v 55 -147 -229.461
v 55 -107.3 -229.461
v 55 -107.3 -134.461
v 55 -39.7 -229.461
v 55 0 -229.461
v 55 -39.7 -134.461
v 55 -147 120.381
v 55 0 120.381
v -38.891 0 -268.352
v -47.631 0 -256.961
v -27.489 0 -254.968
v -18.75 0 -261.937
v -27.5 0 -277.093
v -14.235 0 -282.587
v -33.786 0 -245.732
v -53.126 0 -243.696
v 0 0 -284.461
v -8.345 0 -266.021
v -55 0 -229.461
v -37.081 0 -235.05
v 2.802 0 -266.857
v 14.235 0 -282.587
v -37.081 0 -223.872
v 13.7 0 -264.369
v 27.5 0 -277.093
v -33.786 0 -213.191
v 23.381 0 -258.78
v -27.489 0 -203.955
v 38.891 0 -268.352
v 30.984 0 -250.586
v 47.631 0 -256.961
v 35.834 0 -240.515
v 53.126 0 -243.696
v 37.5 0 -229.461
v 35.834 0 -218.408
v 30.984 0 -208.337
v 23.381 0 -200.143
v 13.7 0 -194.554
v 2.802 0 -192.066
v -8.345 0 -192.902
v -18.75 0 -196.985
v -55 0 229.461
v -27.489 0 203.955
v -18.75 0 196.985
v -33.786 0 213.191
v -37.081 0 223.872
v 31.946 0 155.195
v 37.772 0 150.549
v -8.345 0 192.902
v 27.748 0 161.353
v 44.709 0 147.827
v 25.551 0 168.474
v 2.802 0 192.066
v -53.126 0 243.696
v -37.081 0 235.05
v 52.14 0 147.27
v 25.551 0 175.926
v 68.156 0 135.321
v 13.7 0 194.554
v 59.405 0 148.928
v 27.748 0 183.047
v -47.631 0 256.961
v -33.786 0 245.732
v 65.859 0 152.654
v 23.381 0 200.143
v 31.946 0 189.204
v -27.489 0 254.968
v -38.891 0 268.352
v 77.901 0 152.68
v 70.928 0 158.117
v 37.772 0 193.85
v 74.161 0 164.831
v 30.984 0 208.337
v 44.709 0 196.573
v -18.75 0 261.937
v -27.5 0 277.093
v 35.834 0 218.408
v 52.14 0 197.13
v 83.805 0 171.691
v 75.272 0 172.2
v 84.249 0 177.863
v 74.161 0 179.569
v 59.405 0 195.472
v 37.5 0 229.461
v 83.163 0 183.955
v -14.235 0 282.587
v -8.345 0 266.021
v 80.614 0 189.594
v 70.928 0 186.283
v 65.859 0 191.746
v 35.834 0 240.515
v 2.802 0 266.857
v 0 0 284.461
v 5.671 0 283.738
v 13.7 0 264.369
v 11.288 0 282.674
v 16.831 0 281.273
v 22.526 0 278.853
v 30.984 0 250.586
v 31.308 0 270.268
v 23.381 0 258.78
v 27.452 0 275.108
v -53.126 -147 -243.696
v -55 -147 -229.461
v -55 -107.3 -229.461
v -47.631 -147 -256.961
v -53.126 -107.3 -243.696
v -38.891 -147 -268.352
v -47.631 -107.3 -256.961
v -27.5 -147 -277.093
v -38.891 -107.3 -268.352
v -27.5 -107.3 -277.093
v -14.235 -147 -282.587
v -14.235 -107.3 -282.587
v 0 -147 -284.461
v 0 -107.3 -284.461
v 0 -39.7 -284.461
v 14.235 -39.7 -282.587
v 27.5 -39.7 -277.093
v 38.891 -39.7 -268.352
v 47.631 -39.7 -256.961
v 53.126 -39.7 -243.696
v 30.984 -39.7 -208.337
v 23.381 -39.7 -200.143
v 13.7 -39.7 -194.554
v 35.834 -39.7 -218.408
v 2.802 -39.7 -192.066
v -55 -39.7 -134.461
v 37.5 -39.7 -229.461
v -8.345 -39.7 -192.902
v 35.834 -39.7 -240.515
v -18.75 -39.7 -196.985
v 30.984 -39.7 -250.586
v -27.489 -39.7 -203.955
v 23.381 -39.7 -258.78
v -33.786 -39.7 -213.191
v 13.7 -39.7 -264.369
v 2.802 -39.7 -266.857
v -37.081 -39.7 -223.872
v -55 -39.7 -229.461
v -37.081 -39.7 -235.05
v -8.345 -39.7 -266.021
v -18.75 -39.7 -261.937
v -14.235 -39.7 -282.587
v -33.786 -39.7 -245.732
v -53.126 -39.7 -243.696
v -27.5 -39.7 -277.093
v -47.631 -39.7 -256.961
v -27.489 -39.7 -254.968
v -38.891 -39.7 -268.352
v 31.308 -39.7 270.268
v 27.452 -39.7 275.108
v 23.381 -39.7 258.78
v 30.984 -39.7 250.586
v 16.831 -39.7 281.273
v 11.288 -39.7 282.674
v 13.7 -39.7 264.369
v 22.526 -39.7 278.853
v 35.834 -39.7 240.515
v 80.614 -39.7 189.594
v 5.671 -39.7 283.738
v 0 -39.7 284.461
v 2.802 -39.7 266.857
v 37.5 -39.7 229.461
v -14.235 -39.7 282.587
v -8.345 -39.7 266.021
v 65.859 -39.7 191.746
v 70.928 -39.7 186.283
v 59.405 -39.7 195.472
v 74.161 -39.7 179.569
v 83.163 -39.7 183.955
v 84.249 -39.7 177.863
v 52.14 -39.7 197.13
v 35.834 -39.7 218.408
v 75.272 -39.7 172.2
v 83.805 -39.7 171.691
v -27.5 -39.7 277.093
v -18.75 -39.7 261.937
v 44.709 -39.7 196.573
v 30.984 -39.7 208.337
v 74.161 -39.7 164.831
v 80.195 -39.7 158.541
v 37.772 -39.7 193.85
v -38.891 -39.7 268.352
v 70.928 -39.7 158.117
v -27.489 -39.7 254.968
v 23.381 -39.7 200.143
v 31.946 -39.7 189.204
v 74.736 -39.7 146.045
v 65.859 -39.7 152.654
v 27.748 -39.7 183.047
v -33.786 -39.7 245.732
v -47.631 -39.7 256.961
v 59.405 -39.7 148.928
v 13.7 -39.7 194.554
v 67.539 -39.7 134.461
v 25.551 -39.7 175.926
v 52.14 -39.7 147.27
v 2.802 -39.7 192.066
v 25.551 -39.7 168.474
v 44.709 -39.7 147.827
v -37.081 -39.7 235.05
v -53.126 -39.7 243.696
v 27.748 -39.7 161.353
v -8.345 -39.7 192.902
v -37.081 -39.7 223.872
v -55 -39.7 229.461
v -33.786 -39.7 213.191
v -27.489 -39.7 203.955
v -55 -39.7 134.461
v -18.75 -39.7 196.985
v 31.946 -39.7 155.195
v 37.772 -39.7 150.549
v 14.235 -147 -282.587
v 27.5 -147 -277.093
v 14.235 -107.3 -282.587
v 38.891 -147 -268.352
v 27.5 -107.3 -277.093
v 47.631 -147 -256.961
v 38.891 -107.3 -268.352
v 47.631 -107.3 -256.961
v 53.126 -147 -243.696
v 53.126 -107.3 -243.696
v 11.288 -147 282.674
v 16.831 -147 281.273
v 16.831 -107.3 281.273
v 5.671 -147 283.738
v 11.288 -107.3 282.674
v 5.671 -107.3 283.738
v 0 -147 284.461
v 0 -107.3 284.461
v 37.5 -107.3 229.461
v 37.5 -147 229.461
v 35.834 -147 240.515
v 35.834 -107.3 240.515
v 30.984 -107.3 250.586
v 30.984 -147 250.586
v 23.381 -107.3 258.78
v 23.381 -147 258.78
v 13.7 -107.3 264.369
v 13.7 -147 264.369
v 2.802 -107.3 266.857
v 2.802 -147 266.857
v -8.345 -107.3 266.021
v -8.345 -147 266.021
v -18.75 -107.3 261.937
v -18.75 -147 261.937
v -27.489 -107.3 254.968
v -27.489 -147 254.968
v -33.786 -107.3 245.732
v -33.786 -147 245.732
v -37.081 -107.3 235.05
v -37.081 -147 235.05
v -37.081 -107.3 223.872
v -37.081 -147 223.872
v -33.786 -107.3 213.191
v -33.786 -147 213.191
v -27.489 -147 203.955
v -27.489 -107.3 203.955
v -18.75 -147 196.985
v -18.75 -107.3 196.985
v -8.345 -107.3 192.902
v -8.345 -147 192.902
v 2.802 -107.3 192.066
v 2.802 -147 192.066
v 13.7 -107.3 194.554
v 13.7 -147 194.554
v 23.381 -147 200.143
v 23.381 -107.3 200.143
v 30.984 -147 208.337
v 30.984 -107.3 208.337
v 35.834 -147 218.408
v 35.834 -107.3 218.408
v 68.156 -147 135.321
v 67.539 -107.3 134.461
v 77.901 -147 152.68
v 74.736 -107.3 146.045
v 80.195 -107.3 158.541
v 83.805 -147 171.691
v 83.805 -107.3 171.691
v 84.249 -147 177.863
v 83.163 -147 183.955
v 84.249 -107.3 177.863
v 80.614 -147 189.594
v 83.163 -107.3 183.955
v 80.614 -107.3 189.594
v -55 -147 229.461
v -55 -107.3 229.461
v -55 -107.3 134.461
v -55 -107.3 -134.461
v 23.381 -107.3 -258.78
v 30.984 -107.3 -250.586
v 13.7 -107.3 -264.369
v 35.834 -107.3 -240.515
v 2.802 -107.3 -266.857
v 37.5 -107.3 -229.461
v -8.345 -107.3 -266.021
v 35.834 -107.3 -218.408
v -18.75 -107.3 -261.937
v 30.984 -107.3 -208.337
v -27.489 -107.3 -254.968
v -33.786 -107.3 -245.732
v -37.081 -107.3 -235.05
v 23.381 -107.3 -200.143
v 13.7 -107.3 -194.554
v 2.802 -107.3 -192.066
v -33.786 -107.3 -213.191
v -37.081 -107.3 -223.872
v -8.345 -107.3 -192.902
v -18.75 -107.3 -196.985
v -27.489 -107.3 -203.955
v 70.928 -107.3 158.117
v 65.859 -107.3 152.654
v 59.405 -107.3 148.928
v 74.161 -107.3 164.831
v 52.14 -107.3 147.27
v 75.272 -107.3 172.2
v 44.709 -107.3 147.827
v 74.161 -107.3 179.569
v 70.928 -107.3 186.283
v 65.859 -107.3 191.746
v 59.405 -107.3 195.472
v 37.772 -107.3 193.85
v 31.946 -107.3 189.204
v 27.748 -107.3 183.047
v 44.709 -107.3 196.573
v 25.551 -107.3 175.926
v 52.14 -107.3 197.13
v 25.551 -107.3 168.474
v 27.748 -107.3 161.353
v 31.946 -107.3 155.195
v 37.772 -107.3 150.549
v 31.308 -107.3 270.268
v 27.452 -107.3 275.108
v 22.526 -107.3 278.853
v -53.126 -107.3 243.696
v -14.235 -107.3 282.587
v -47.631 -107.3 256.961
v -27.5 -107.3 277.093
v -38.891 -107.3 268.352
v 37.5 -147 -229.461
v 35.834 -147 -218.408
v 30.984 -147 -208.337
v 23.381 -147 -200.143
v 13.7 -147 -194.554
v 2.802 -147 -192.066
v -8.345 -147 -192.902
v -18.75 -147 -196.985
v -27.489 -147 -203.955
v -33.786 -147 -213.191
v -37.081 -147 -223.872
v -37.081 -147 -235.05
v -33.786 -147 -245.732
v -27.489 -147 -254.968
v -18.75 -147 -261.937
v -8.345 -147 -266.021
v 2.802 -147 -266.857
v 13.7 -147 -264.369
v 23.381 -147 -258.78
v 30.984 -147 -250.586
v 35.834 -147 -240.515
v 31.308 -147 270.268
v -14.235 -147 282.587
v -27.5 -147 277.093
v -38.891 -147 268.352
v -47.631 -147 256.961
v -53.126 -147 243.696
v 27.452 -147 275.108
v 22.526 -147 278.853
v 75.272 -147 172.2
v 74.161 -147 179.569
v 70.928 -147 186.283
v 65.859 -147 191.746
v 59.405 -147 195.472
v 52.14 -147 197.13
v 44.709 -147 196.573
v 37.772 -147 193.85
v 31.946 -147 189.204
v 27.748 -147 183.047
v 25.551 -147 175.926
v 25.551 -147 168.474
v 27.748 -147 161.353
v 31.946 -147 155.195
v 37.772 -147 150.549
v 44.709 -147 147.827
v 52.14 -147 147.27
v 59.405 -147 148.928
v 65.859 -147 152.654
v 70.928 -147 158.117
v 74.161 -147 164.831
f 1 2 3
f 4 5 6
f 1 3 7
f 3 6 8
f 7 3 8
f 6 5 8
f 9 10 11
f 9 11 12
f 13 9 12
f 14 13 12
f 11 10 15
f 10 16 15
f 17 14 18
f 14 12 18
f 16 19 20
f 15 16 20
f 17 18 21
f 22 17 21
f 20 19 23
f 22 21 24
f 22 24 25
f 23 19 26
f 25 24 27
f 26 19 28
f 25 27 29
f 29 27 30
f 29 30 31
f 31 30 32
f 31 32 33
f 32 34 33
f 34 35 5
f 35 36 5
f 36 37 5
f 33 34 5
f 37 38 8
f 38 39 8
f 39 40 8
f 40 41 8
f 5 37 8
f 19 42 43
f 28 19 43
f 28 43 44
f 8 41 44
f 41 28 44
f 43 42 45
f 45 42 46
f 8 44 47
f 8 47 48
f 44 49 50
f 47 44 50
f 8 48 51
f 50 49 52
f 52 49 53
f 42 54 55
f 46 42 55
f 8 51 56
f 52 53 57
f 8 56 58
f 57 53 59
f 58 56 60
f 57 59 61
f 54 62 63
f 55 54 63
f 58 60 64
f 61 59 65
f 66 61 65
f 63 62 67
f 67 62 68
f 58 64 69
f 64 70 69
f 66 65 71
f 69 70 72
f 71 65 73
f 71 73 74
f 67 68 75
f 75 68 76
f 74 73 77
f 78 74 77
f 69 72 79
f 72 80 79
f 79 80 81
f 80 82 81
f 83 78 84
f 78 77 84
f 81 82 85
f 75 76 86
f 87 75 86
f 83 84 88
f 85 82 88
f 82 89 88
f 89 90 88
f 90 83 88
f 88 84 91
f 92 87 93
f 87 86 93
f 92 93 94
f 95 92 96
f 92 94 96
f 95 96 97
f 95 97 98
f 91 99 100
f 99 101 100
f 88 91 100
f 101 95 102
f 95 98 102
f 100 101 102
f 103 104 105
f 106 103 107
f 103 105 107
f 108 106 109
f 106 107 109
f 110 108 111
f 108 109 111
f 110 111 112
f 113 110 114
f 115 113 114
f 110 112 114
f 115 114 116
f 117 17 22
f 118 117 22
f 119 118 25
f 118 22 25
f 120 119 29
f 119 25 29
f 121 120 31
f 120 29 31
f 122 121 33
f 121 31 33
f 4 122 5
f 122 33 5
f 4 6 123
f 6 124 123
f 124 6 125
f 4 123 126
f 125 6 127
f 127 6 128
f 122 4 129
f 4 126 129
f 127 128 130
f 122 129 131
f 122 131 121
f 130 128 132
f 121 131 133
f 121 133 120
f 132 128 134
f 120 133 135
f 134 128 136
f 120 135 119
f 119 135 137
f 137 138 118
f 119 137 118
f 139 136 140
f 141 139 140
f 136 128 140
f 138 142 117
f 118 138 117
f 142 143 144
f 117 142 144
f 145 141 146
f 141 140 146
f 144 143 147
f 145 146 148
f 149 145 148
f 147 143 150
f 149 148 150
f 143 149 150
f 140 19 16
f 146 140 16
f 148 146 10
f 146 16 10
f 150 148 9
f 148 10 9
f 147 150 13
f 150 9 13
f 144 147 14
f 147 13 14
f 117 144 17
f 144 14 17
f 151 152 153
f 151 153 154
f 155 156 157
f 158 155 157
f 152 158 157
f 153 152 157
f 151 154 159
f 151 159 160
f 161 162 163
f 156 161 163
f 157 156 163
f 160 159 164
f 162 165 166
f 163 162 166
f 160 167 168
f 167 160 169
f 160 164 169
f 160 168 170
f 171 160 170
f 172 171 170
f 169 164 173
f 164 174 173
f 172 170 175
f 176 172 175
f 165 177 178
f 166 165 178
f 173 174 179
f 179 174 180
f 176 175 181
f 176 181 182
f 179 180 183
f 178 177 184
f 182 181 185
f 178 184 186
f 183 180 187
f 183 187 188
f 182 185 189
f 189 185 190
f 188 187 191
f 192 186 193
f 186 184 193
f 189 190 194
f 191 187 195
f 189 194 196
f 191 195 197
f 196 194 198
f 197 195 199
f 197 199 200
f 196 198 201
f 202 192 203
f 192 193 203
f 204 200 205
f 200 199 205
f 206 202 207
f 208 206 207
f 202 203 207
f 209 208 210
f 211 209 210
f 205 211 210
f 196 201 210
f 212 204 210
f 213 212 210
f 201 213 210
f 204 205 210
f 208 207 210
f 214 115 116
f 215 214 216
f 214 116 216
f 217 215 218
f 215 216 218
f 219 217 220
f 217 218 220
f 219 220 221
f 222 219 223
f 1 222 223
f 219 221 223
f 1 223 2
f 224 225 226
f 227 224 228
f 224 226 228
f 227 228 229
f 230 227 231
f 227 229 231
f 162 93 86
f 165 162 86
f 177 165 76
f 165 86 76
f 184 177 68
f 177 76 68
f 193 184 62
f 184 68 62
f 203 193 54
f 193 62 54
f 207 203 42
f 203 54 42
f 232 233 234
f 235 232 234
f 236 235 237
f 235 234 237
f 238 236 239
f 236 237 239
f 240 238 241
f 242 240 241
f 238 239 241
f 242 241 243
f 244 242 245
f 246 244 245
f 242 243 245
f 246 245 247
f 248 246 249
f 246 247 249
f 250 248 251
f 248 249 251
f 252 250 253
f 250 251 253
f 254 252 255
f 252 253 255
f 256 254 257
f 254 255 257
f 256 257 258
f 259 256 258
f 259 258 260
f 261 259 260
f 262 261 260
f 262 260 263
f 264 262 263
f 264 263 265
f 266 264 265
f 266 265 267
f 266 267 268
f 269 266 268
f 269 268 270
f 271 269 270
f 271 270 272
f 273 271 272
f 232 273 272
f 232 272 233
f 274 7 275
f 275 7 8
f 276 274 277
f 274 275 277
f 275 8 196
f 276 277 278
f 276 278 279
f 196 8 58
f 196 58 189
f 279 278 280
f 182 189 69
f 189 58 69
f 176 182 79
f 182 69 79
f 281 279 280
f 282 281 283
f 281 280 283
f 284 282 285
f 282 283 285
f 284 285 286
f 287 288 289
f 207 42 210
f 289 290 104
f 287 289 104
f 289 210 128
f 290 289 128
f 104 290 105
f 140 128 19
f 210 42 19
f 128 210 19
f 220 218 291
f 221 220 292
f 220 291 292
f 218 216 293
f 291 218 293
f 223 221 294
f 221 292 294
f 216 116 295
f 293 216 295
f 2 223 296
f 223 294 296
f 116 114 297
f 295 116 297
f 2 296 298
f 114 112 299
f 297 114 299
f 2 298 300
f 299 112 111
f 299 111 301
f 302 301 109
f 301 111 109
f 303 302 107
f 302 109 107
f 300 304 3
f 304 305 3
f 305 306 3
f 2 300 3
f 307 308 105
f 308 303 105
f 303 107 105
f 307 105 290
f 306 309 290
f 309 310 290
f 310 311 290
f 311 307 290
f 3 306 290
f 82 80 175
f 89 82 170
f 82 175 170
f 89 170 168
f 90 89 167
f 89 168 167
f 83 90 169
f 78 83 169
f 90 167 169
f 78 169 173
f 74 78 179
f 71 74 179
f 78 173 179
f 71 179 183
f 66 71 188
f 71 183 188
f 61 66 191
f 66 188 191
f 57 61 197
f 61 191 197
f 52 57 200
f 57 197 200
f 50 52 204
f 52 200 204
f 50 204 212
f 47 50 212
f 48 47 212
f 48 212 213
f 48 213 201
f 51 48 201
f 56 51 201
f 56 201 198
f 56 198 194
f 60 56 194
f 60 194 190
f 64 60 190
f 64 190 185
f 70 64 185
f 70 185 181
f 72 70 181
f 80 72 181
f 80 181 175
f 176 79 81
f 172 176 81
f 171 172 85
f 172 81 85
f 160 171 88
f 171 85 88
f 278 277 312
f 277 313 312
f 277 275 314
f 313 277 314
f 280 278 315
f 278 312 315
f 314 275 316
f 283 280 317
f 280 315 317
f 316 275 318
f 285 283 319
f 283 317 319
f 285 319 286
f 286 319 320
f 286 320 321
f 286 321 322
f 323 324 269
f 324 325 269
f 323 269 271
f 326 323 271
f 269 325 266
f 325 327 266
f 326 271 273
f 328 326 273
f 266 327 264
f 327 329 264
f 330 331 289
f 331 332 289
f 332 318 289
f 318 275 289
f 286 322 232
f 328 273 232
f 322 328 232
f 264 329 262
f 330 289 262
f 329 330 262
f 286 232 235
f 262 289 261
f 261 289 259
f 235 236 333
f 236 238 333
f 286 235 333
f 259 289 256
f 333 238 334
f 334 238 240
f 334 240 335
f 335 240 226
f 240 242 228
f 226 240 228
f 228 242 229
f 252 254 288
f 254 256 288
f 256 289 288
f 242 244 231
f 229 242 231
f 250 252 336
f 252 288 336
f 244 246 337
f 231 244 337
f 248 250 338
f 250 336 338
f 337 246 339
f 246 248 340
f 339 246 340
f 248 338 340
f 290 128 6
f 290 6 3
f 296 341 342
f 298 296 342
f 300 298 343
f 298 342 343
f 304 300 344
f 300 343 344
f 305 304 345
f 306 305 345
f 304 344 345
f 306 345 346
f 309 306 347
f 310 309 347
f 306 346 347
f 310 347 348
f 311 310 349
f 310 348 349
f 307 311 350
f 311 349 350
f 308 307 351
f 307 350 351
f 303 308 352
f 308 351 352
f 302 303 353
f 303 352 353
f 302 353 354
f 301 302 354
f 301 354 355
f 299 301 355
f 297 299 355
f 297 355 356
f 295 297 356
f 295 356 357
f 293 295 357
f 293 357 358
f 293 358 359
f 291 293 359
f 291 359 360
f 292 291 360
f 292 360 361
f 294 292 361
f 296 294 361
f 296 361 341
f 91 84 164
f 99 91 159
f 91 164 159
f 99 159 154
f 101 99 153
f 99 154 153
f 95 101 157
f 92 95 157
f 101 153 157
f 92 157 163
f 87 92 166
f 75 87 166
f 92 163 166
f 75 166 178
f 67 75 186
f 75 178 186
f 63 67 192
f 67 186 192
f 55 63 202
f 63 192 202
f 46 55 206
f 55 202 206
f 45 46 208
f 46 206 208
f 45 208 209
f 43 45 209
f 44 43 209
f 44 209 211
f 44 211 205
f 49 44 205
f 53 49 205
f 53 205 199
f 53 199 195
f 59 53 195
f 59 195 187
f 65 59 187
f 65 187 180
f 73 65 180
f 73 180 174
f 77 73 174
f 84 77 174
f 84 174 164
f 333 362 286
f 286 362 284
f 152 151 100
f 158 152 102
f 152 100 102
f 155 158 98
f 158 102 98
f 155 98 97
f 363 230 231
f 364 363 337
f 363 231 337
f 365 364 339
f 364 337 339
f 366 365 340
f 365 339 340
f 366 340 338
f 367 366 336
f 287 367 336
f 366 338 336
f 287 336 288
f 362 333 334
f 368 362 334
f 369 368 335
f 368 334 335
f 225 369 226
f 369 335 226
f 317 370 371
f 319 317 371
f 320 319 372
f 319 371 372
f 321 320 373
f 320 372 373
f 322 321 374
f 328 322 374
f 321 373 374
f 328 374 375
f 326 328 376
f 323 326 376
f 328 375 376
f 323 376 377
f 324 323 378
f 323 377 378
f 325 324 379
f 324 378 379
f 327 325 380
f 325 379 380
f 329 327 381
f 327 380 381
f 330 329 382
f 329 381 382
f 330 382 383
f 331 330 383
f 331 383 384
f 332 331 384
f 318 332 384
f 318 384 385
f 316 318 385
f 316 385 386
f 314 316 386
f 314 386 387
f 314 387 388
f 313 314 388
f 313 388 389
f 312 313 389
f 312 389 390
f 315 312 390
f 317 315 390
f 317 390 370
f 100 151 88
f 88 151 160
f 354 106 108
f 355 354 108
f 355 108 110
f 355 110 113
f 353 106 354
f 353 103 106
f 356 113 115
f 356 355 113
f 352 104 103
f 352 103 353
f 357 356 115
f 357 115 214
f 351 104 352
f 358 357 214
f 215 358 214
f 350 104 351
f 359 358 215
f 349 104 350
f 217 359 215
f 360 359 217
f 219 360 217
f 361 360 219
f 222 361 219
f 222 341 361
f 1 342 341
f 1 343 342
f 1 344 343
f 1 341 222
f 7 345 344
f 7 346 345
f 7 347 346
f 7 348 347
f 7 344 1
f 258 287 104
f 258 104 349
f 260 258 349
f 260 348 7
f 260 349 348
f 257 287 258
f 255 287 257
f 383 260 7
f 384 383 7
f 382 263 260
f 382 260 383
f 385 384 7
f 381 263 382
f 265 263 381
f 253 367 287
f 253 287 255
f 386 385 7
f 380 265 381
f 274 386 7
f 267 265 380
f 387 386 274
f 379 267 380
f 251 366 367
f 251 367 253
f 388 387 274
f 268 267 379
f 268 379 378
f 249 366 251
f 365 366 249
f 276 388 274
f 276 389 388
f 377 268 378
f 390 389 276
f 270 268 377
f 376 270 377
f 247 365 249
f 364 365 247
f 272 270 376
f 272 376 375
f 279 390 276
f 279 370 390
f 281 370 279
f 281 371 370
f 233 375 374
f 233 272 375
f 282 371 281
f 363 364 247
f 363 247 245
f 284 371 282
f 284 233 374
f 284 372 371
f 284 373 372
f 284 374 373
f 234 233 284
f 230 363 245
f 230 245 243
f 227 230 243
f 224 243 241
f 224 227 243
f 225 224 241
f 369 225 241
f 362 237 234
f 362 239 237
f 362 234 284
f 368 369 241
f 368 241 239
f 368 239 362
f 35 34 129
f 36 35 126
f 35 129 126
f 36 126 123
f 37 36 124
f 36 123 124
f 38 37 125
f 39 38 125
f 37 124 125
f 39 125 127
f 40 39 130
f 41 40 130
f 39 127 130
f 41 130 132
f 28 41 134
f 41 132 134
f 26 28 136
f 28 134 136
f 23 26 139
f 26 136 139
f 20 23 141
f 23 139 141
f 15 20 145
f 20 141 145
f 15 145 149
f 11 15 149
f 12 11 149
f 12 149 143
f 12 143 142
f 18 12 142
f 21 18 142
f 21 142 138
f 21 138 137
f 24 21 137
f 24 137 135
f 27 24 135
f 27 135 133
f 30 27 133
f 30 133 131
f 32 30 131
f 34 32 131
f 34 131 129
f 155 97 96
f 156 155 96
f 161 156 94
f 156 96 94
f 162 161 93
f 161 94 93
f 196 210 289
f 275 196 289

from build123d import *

# Parameters (mm, degrees)
F1_DEPTH = 147
F2_R     = 37.5
F2_R_2   = 25
F3_DEPTH = 147.001
F5_DEPTH = 147.001
F6_R     = 25
F7_W     = 67.6
F7_H     = 95
F7_H_2   = 55
F8_DEPTH = 139.2839551991


with BuildPart() as f1:
    # F0 (on Front) → F1 (new body)
    with BuildSketch(Plane.XZ):
        with BuildLine():
            Line((55, -229.4613795656), (55, 120.3808841783))
            ThreePointArc((55, 120.3808841783), (80.7033356829, 220.2549606622), (0, 284.4613795656))
            ThreePointArc((0, 284.4613795656), (-38.8908729653, 268.3522525309), (-55, 229.4613795656))
            Line((-55, 229.4613795656), (-55, -229.4613795656))
            ThreePointArc((-55, -229.4613795656), (-38.8908729653, -268.3522525309), (0, -284.4613795656))
            ThreePointArc((0, -284.4613795656), (38.8908729653, -268.3522525309), (55, -229.4613795656))
        make_face()
    extrude(amount=F1_DEPTH)

    # F2 (on face) → F3 (cut, through all)
    with BuildSketch(Plane.XZ.offset(147)):
        with Locations((0, 229.4613795656)):
            Circle(F2_R)
        with Locations((0, -229.4613795656)):
            Circle(F2_R)
        with Locations((50.271846354, 172.1997708082)):
            Circle(F2_R_2)
    extrude(amount=-F3_DEPTH, mode=Mode.SUBTRACT)

    # F4 (on face) → F5 (cut, through all)
    with BuildSketch(Plane.XZ.offset(147)):
        with BuildLine():
            ThreePointArc((85.2657948536, 181.983535776), (71.7102726141, 239.5566412204), (26.6566362615, 277.878756312))
            Line((26.6566362615, 277.878756312), (85.2657948536, 181.983535776))
        make_face()
    extrude(amount=-F5_DEPTH, mode=Mode.SUBTRACT)

    # F6
    f6_edges = [f1.edges().sort_by_distance(p)[0] for p in [
        (85.265795, -73.5, 181.983536),
        (26.656636, -73.5, 277.878756),
    ]]
    fillet(f6_edges, radius=F6_R)

    # F7 (on face) → F8 (cut, through all)
    with BuildSketch(Plane(origin=(-55, 0, 0), x_dir=(0, -1, 0), z_dir=(-1, 0, 0))):
        with Locations((73.5, -181.9613795656)):
            Rectangle(F7_W, F7_H)
        with Locations((73.5, -256.9613795656)):
            Rectangle(F7_W, F7_H_2)
        with Locations((73.5, 181.9613795656)):
            Rectangle(F7_W, F7_H)
        with Locations((73.5, 256.9613795656)):
            Rectangle(F7_W, F7_H_2)
    extrude(amount=-F8_DEPTH, mode=Mode.SUBTRACT)


solid = f1.part
